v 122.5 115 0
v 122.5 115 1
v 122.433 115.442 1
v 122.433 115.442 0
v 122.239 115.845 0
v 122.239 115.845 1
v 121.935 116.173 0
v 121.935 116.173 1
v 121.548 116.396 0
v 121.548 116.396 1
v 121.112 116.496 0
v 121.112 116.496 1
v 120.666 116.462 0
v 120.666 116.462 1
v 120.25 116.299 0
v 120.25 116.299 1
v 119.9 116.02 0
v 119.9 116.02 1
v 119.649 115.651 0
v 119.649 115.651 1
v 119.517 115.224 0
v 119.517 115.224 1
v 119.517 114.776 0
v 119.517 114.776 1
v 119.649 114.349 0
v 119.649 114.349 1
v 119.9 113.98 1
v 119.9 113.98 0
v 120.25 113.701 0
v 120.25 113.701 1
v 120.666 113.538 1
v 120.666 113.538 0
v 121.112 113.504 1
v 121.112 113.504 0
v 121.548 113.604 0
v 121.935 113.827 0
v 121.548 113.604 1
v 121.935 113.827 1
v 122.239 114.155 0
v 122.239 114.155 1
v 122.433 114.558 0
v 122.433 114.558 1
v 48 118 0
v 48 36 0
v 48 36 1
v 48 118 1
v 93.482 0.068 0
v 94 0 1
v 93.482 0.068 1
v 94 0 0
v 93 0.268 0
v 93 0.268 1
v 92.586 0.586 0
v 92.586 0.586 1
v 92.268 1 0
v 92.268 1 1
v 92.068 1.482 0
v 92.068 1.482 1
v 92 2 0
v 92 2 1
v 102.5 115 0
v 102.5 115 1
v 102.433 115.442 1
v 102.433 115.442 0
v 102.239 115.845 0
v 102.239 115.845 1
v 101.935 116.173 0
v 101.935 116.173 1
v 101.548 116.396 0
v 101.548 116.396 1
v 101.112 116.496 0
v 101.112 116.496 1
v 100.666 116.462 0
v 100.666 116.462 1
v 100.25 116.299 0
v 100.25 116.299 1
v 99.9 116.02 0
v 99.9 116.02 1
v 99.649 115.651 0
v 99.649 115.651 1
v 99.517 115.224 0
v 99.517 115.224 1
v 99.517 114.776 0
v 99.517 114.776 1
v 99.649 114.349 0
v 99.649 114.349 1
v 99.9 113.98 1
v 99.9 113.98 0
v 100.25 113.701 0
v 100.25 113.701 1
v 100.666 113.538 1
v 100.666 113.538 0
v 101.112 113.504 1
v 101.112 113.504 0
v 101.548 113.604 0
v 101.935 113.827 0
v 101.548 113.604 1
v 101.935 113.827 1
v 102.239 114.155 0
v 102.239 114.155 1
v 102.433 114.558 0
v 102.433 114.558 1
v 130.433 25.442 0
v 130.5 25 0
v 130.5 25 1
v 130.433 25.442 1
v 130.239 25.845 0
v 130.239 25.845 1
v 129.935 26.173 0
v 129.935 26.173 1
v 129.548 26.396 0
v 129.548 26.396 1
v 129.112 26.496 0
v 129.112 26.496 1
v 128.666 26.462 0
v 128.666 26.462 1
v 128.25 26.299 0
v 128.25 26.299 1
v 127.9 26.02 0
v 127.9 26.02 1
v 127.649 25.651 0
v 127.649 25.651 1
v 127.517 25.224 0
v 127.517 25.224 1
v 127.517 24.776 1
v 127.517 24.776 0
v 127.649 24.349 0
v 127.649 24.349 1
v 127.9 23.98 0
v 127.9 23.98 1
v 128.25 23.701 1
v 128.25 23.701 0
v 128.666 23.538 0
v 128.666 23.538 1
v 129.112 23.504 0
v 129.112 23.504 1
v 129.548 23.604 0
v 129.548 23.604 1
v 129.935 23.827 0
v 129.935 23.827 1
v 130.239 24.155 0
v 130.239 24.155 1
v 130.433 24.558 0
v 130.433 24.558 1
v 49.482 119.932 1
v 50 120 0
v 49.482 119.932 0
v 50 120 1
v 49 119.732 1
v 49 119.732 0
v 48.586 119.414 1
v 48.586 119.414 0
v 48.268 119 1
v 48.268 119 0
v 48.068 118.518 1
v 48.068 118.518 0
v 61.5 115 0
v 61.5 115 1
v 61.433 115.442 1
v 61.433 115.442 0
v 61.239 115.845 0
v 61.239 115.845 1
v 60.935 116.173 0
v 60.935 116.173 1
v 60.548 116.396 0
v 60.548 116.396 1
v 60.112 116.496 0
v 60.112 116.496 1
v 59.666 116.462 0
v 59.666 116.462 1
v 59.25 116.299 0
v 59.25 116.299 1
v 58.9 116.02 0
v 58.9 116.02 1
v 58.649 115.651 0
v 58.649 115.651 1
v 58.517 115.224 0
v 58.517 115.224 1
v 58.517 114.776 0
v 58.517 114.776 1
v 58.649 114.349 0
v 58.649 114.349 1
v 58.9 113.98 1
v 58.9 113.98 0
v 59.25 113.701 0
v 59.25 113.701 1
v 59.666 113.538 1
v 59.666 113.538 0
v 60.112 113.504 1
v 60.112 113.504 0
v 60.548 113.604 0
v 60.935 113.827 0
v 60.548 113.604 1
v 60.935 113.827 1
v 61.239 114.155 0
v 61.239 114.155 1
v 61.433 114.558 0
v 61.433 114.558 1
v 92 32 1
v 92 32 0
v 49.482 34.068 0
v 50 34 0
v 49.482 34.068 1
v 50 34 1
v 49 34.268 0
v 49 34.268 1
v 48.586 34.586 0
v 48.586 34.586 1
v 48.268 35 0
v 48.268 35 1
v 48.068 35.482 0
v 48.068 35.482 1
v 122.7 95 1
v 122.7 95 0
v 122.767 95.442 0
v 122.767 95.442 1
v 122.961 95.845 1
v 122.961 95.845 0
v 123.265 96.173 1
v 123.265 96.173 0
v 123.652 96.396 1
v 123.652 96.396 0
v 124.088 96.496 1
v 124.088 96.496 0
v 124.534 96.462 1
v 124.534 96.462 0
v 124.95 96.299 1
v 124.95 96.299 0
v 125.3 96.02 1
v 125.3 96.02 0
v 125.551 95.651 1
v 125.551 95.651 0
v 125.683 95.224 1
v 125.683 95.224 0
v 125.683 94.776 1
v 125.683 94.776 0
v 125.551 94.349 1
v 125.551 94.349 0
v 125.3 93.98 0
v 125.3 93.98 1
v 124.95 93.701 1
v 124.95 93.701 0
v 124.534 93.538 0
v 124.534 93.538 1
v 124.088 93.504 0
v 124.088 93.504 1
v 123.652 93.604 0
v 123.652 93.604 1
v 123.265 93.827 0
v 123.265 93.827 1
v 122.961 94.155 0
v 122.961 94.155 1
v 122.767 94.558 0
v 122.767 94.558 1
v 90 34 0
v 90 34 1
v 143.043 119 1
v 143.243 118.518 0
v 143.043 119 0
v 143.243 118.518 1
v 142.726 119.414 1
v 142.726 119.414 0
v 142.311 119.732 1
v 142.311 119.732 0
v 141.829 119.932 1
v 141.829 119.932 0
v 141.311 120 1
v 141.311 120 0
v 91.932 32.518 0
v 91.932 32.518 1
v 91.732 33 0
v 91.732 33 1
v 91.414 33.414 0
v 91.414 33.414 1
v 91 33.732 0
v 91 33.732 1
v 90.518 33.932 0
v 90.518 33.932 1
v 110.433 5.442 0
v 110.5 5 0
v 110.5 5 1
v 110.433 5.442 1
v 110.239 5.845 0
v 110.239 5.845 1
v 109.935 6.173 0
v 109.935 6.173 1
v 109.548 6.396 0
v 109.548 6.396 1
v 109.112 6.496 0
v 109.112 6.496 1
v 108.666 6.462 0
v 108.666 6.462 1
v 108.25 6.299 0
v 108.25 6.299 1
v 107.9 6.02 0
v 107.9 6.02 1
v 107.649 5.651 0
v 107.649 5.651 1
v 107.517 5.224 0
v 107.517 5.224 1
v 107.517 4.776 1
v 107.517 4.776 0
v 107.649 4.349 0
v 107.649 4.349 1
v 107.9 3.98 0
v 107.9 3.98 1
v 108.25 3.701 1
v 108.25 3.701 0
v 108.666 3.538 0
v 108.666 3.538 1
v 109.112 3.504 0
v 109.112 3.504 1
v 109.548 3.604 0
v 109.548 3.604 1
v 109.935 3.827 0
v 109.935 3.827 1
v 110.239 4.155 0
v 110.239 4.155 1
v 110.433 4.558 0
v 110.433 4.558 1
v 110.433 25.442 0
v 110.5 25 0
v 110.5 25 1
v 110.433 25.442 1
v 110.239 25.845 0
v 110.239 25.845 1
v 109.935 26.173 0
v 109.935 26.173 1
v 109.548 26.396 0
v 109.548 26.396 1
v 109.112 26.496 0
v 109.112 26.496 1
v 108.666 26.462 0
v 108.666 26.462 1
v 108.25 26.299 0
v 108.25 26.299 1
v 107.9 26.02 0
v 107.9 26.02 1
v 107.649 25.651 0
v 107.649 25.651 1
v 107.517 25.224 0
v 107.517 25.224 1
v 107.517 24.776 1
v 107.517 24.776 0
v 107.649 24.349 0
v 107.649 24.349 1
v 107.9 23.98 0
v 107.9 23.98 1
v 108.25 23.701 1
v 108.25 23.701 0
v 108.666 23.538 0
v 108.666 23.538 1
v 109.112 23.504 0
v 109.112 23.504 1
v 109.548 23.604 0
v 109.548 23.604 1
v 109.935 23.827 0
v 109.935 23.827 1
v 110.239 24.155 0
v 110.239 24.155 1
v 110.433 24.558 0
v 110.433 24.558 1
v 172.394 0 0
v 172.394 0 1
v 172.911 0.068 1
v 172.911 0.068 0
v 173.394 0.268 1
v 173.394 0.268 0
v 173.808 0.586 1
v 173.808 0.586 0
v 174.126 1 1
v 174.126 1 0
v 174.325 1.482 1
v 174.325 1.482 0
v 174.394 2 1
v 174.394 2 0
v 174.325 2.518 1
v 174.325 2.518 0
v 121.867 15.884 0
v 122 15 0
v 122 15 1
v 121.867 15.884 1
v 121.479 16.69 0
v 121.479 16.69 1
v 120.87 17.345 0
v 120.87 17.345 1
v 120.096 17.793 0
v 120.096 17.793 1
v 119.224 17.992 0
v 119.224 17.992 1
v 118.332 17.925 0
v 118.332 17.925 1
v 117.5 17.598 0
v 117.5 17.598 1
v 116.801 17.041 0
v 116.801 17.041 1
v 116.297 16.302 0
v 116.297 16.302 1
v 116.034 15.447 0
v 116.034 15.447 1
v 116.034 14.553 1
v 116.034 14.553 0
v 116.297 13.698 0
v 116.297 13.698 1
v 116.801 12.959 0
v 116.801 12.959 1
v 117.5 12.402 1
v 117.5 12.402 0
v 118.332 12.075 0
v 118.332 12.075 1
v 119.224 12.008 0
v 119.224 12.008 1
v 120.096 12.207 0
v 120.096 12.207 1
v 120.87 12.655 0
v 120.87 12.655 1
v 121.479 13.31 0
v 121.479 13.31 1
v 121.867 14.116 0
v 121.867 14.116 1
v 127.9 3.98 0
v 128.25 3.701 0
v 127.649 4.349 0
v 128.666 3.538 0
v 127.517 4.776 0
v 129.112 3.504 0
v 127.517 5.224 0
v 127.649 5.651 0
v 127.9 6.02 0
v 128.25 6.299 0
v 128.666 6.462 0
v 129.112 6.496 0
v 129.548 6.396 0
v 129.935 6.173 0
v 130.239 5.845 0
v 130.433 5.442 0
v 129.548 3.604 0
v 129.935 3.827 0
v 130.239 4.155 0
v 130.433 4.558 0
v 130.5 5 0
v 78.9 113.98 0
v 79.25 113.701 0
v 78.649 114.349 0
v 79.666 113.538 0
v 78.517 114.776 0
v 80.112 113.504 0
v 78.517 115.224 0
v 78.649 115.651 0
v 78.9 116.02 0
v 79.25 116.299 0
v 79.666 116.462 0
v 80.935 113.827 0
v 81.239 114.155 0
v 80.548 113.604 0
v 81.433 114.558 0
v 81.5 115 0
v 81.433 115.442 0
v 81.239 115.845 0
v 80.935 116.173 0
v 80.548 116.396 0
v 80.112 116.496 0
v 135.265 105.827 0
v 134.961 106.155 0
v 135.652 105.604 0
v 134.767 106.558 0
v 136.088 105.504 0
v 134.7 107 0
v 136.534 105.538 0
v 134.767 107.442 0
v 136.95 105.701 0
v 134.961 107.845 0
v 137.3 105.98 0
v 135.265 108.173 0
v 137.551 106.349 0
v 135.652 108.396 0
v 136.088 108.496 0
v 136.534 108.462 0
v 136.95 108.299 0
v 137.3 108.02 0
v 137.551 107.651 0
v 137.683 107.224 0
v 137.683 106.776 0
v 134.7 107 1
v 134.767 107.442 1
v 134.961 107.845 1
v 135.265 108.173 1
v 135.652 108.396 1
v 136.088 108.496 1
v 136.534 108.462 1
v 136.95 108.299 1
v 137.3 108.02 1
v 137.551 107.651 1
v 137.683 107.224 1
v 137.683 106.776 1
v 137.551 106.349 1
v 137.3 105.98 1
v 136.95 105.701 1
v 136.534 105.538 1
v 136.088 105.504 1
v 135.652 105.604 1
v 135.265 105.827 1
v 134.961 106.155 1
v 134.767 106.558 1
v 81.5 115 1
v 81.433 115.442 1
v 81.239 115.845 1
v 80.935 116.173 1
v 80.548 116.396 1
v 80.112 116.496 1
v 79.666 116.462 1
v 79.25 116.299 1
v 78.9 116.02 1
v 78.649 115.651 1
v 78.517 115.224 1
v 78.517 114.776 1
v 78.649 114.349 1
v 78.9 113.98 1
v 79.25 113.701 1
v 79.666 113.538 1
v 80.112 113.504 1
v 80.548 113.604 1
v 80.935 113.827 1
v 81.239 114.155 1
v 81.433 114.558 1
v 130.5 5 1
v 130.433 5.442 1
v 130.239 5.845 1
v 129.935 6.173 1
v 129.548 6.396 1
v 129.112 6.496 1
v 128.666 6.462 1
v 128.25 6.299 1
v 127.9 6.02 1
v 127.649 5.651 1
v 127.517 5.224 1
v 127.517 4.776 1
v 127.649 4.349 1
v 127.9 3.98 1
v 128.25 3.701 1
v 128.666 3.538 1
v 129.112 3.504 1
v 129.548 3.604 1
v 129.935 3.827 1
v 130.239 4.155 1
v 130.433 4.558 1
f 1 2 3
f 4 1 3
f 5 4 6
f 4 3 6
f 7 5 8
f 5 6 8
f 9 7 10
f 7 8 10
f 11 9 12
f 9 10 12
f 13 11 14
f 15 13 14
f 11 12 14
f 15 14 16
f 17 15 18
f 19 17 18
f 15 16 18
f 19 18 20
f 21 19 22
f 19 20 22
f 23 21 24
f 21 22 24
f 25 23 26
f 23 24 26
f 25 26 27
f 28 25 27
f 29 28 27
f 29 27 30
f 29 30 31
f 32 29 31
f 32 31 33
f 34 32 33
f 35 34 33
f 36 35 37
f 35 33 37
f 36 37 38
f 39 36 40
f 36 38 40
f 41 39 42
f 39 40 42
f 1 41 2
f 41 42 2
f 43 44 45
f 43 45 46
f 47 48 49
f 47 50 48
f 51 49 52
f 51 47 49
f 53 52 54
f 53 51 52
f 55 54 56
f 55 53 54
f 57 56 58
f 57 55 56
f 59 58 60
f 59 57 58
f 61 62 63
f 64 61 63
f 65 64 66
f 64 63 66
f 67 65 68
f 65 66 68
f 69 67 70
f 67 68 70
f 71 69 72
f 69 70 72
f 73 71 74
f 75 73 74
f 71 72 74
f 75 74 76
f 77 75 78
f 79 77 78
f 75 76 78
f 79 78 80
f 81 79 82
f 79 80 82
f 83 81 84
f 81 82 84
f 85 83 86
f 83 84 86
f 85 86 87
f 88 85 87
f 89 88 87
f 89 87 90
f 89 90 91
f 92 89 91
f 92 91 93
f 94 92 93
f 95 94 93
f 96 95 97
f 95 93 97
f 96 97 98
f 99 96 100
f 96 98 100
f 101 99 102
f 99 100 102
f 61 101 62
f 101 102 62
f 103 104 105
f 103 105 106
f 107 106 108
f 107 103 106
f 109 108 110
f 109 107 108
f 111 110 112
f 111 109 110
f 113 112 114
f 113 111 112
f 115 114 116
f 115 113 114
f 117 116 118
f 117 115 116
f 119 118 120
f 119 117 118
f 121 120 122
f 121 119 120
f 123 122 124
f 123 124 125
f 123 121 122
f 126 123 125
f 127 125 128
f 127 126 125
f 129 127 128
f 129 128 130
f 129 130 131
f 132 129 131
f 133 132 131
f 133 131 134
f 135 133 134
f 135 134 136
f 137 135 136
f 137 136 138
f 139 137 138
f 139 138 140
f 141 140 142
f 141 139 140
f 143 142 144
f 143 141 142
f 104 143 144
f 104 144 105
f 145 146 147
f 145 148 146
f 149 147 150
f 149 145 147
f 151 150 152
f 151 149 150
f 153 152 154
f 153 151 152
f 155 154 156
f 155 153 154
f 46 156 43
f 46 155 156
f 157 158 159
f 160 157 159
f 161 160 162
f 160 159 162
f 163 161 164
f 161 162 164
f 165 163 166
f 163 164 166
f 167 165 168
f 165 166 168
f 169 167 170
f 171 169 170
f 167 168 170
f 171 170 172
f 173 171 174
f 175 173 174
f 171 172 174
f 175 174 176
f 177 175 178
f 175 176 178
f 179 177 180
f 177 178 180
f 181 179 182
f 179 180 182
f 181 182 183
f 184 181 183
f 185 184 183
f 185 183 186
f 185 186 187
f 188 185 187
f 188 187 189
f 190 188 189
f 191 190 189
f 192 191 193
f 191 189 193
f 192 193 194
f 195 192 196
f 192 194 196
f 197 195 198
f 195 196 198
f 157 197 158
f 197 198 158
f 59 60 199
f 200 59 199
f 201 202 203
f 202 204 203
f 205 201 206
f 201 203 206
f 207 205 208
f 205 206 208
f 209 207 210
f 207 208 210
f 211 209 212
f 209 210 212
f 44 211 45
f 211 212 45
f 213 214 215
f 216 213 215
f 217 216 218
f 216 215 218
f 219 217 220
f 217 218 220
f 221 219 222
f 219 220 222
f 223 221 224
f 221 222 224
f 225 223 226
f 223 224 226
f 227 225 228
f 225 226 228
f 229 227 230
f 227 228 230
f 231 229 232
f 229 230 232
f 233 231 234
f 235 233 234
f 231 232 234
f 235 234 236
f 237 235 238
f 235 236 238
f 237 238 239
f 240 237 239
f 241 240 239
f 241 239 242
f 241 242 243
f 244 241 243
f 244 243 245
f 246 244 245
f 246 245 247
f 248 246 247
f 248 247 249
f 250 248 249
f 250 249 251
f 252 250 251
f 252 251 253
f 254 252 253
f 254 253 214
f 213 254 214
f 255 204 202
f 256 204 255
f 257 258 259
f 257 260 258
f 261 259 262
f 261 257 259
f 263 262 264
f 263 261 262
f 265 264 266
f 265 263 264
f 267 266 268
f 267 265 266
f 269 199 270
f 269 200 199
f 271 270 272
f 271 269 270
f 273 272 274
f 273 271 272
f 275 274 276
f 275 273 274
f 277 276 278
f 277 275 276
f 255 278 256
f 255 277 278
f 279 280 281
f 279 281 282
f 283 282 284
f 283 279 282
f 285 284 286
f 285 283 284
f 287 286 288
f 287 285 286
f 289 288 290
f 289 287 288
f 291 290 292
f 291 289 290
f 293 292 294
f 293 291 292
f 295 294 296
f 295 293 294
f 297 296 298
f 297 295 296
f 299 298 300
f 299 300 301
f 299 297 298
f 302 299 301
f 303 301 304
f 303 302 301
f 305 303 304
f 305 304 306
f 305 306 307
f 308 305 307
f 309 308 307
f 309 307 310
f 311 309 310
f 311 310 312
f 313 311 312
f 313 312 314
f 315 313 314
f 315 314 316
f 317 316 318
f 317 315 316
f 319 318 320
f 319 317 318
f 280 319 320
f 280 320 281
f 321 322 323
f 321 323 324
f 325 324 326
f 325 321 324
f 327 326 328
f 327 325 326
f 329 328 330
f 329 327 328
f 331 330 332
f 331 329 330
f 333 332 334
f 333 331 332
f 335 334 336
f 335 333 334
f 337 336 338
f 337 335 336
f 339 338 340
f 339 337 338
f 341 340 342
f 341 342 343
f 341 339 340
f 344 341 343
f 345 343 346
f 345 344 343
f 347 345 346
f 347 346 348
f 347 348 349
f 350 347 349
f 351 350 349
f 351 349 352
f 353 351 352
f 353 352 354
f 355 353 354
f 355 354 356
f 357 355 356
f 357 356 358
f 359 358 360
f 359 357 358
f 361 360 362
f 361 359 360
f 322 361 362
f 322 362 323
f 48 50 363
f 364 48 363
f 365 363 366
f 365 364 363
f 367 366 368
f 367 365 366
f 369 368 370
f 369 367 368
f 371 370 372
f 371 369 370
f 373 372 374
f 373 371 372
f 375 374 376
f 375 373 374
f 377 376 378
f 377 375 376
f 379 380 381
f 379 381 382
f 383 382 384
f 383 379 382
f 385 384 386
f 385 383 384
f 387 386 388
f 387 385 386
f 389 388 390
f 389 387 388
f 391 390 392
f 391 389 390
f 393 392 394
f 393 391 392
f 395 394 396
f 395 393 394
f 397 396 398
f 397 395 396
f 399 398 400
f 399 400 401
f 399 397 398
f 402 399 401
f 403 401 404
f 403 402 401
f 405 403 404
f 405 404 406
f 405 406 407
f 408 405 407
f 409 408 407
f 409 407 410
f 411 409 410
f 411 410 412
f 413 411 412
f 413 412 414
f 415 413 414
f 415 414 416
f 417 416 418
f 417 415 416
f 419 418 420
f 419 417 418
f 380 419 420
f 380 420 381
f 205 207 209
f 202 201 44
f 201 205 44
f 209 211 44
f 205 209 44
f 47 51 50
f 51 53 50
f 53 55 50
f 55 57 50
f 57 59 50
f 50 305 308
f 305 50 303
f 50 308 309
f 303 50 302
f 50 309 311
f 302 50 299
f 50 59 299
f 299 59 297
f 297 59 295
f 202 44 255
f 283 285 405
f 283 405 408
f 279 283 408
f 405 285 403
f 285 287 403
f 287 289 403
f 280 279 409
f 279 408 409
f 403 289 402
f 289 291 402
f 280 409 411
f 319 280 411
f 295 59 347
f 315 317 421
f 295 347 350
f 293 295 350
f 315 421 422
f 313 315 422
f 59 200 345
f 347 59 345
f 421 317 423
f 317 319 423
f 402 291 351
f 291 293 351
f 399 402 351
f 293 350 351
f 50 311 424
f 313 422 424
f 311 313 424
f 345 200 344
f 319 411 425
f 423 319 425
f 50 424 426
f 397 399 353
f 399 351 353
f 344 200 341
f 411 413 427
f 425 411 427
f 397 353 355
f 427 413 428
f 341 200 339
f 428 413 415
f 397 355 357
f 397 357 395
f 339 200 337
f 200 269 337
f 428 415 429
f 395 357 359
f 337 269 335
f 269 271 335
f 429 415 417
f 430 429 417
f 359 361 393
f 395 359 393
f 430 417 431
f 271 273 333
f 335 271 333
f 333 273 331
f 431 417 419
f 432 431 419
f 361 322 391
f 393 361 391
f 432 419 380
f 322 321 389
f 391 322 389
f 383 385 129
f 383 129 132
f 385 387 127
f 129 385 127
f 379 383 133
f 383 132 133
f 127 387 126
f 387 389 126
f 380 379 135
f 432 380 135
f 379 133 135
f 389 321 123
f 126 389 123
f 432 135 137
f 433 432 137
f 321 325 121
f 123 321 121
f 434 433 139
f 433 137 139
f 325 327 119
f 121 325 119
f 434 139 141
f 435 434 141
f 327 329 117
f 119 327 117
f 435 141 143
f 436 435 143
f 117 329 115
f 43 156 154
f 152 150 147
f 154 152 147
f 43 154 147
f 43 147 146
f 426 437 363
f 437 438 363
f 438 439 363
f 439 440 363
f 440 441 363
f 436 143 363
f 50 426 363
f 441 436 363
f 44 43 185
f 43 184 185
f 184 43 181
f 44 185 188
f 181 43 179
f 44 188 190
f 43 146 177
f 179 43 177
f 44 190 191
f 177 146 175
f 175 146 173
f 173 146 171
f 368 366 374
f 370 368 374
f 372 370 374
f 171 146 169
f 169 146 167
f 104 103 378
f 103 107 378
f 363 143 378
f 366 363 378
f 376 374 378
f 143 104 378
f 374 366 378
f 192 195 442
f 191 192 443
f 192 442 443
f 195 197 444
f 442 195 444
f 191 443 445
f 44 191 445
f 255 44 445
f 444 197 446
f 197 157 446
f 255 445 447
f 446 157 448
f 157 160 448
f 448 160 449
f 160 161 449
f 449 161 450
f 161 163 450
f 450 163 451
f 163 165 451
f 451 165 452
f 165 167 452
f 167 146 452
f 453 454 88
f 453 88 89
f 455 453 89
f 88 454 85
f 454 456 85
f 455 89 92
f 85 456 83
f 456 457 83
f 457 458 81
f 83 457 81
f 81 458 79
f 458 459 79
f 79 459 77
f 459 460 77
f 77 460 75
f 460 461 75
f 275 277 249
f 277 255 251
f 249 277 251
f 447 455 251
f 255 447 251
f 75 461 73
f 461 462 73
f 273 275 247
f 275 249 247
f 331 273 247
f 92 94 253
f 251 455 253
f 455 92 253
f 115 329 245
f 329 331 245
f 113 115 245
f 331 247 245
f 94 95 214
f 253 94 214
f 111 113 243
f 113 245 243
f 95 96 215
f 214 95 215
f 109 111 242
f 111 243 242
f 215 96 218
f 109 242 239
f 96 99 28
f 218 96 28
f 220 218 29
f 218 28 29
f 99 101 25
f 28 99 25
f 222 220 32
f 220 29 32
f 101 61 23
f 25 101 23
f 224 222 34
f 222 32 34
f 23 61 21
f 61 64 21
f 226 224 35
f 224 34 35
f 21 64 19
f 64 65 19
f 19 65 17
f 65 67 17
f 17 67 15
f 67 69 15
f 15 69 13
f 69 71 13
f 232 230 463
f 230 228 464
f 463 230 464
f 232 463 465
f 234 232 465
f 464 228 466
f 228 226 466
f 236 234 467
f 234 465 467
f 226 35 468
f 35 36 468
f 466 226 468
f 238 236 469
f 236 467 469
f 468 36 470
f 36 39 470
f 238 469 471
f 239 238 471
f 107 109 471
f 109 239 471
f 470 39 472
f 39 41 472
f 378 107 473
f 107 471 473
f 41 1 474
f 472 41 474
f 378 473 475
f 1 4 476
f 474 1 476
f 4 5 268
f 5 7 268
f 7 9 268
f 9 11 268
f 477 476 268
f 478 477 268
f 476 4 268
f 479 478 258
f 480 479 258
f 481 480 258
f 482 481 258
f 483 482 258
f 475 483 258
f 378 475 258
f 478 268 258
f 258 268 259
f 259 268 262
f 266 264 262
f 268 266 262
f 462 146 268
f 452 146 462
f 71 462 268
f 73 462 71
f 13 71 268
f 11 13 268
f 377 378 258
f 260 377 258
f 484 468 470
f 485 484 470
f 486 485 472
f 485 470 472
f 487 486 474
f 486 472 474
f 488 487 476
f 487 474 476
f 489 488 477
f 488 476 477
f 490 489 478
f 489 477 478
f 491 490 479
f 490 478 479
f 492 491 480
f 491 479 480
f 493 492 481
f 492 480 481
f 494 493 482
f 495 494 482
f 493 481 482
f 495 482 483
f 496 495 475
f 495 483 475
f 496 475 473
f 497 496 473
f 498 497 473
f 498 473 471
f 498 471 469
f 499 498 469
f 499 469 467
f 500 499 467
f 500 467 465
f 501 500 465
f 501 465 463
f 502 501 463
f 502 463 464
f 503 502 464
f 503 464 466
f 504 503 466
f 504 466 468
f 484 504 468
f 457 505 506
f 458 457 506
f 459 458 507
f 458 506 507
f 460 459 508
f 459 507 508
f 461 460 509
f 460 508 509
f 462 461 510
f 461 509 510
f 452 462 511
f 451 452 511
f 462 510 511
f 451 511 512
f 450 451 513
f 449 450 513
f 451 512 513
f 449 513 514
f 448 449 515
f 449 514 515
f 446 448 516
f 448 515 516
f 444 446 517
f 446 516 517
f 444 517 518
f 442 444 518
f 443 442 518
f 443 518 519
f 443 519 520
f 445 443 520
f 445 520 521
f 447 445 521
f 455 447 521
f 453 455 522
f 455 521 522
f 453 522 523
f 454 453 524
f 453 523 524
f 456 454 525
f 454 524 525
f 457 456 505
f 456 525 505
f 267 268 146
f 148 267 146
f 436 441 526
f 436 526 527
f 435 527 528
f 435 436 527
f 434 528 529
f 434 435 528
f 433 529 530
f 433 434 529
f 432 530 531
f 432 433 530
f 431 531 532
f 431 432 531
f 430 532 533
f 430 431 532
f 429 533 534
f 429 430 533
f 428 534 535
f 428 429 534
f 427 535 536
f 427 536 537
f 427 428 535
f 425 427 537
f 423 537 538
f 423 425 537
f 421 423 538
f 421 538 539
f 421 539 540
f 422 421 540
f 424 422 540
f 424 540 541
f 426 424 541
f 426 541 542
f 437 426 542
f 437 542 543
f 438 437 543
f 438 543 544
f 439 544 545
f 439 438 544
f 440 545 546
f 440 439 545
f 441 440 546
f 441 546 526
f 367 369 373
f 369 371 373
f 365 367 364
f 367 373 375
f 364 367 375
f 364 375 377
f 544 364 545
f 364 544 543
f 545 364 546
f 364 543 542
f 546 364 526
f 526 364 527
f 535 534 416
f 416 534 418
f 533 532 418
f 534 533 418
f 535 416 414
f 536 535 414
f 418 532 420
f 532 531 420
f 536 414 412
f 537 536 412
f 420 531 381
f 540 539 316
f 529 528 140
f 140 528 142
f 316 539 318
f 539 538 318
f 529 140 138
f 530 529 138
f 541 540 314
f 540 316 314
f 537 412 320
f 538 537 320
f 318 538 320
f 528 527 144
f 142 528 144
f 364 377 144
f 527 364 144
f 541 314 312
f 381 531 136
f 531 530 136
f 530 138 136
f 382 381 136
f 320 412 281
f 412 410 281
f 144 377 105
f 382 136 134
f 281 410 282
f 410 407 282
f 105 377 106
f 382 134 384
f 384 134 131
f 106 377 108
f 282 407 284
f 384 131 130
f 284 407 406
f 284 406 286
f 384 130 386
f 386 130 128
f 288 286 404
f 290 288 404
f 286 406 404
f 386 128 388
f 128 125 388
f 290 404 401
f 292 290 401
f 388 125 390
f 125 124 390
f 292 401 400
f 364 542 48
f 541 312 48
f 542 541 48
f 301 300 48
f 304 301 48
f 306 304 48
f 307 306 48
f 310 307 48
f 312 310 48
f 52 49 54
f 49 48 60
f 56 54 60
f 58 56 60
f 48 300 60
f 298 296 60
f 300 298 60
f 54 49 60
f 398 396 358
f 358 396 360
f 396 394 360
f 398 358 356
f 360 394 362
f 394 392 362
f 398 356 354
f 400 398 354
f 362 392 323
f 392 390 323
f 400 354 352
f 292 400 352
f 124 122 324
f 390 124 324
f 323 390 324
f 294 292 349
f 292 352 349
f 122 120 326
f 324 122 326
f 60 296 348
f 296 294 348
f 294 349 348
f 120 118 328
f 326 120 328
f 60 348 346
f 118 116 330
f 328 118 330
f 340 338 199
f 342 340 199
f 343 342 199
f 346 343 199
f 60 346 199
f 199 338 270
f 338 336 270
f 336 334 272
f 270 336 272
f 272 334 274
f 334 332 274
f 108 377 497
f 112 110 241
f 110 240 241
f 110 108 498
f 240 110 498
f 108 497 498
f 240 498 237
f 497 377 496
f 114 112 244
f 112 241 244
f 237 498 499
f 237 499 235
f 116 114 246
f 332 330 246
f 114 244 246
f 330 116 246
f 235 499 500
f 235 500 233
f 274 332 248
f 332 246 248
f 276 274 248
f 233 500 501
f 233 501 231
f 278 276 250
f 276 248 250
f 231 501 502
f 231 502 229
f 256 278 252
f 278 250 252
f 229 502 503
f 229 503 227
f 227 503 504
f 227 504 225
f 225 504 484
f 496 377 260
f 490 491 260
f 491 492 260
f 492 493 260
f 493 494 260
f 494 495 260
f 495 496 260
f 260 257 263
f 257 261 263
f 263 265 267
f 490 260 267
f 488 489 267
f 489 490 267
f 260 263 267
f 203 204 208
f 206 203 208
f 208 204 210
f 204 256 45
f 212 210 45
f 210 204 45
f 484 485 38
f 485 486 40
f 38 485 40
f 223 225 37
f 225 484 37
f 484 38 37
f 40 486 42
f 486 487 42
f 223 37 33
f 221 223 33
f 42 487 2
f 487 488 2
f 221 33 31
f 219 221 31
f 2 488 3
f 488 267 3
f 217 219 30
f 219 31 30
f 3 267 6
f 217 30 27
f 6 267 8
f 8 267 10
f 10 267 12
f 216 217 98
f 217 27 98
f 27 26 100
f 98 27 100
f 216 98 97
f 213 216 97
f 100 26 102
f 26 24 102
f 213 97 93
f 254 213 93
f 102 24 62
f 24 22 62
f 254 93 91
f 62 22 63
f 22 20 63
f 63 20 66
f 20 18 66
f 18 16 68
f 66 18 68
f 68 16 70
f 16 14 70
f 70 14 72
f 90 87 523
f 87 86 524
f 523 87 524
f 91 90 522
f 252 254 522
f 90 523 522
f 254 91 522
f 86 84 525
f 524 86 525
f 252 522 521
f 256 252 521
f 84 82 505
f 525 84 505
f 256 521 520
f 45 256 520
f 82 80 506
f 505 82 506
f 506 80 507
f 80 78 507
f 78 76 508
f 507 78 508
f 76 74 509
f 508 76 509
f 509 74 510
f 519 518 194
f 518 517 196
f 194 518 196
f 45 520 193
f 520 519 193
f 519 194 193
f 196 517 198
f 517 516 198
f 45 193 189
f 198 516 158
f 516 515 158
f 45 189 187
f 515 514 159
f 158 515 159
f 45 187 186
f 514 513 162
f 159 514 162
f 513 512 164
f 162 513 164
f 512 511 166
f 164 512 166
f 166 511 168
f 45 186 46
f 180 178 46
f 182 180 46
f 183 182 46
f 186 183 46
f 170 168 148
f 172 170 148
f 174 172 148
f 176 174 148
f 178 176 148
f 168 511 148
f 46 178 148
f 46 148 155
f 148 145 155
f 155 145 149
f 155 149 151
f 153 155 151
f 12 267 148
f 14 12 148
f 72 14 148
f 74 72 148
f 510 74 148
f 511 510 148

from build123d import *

# Parameters (mm, degrees)
SKETCH_1_R           = 1.5
SKETCH_1_R_2         = 3
EXTRUDE_1_DEPTH      = 1
SKETCH_4_R           = 1.5
CUT_EXTRUDE_2_DEPTH  = 4
SKETCH_5_R           = 1.5
CUT_EXTRUDE_3_DEPTH  = 10
SKETCH_6_W           = 53
SKETCH_6_H           = 34
CUT_EXTRUDE_4_DEPTH  = 10
SKETCH_7_W           = 39
SKETCH_7_H           = 34
CUT_EXTRUDE_5_DEPTH  = 10
SKETCH_10_R          = 10
CUT_EXTRUDE_8_DEPTH  = 10
SKETCH_13_R          = 1.5
CUT_EXTRUDE_10_DEPTH = 1
FILLET_1_R           = 2
EXTRUDE_START        = -1
SKETCH_20_R          = 10
EXTRUDE_3_DEPTH      = 1
SKETCH_21_W          = 48
SKETCH_21_H          = 86
CUT_EXTRUDE_16_DEPTH = 10
FILLET_5_R           = 2


with BuildPart() as part:
    # 草图1 → 凸台-拉伸1 (new body)
    with BuildSketch(Plane.XY):
        Polygon((0, 0), (175, 0), (142.846096908, 120), (0, 120), align=None)
        with Locations((129, 25)):
            Circle(SKETCH_1_R, mode=Mode.SUBTRACT)
        with Locations((129, 5)):
            Circle(SKETCH_1_R, mode=Mode.SUBTRACT)
        with Locations((119, 15)):
            Circle(SKETCH_1_R_2, mode=Mode.SUBTRACT)
        with Locations((109, 5)):
            Circle(SKETCH_1_R, mode=Mode.SUBTRACT)
        with Locations((109, 25)):
            Circle(SKETCH_1_R, mode=Mode.SUBTRACT)
    extrude(amount=EXTRUDE_1_DEPTH)

    # 草图4 → 切除-拉伸2 (cut)
    with BuildSketch(Plane(origin=(0, 0, 0), x_dir=(-1, 0, 0), z_dir=(0, 0, -1))):
        with Locations((-22, 101)):
            Circle(SKETCH_4_R)
        with Locations((-22, 81)):
            Circle(SKETCH_4_R)
        with Locations((-22, 60)):
            Circle(SKETCH_4_R)
        with Locations((-22, 40)):
            Circle(SKETCH_4_R)
    extrude(amount=-CUT_EXTRUDE_2_DEPTH, mode=Mode.SUBTRACT)

    # 草图5 → 切除-拉伸3 (cut)
    with BuildSketch(Plane(origin=(0, 0, 0), x_dir=(-1, 0, 0), z_dir=(0, 0, -1))):
        with Locations((-136.2, 107)):
            Circle(SKETCH_5_R)
        with Locations((-124.2, 95)):
            Circle(SKETCH_5_R)
    extrude(amount=-CUT_EXTRUDE_3_DEPTH, mode=Mode.SUBTRACT)

    # 草图6 → 切除-拉伸4 (cut)
    with BuildSketch(Plane.XY.offset(1)):
        with Locations((26.5, 17)):
            Rectangle(SKETCH_6_W, SKETCH_6_H)
    extrude(amount=-CUT_EXTRUDE_4_DEPTH, mode=Mode.SUBTRACT)

    # 草图7 → 切除-拉伸5 (cut)
    with BuildSketch(Plane.XY.offset(1)):
        with Locations((72.5, 17)):
            Rectangle(SKETCH_7_W, SKETCH_7_H)
    extrude(amount=-CUT_EXTRUDE_5_DEPTH, mode=Mode.SUBTRACT)

    # 草图10 → 切除-拉伸8 (cut)
    with BuildSketch(Plane.XY.offset(1)):
        with Locations((37, 104)):
            Circle(SKETCH_10_R)
    extrude(amount=-CUT_EXTRUDE_8_DEPTH, mode=Mode.SUBTRACT)

    # 草图13 → 切除-拉伸10 (cut)
    with BuildSketch(Plane.XY.offset(1)):
        with Locations((121, 115)):
            Circle(SKETCH_13_R)
        with Locations((101, 115)):
            Circle(SKETCH_13_R)
        with Locations((80, 115)):
            Circle(SKETCH_13_R)
        with Locations((60, 115)):
            Circle(SKETCH_13_R)
        with Locations((45, 115)):
            Circle(SKETCH_13_R)
        with Locations((25, 115)):
            Circle(SKETCH_13_R)
    extrude(amount=-CUT_EXTRUDE_10_DEPTH, mode=Mode.SUBTRACT)

    # 圆角1
    fillet_1_edges = [part.edges().sort_by_distance(p)[0] for p in [
        (0, 34, 0.5),
        (0, 120, 0.5),
        (142.846096908, 120, 0.5),
        (175, 0, 0.5),
        (92, 34, 0.5),
        (92, 0, 0.5),
    ]]
    fillet(fillet_1_edges, radius=FILLET_1_R)

    # 草图20 → 凸台-拉伸3 (add)
    with BuildSketch(Plane(origin=(0, 0, 0), x_dir=(-1, 0, 0), z_dir=(0, 0, -1)).offset(EXTRUDE_START)):
        with Locations((-37, 104)):
            Circle(SKETCH_20_R)
    extrude(amount=EXTRUDE_3_DEPTH)

    # 草图21 → 切除-拉伸16 (cut)
    with BuildSketch(Plane(origin=(0, 0, 0), x_dir=(-1, 0, 0), z_dir=(0, 0, -1))):
        with Locations((-24, 77)):
            Rectangle(SKETCH_21_W, SKETCH_21_H)
    extrude(amount=-CUT_EXTRUDE_16_DEPTH, mode=Mode.SUBTRACT)

    # 圆角5
    fillet_5_edges = [part.edges().sort_by_distance(p)[0] for p in [
        (48, 34, 0.5),
        (48, 120, 0.5),
    ]]
    fillet(fillet_5_edges, radius=FILLET_5_R)


solid = part.part
